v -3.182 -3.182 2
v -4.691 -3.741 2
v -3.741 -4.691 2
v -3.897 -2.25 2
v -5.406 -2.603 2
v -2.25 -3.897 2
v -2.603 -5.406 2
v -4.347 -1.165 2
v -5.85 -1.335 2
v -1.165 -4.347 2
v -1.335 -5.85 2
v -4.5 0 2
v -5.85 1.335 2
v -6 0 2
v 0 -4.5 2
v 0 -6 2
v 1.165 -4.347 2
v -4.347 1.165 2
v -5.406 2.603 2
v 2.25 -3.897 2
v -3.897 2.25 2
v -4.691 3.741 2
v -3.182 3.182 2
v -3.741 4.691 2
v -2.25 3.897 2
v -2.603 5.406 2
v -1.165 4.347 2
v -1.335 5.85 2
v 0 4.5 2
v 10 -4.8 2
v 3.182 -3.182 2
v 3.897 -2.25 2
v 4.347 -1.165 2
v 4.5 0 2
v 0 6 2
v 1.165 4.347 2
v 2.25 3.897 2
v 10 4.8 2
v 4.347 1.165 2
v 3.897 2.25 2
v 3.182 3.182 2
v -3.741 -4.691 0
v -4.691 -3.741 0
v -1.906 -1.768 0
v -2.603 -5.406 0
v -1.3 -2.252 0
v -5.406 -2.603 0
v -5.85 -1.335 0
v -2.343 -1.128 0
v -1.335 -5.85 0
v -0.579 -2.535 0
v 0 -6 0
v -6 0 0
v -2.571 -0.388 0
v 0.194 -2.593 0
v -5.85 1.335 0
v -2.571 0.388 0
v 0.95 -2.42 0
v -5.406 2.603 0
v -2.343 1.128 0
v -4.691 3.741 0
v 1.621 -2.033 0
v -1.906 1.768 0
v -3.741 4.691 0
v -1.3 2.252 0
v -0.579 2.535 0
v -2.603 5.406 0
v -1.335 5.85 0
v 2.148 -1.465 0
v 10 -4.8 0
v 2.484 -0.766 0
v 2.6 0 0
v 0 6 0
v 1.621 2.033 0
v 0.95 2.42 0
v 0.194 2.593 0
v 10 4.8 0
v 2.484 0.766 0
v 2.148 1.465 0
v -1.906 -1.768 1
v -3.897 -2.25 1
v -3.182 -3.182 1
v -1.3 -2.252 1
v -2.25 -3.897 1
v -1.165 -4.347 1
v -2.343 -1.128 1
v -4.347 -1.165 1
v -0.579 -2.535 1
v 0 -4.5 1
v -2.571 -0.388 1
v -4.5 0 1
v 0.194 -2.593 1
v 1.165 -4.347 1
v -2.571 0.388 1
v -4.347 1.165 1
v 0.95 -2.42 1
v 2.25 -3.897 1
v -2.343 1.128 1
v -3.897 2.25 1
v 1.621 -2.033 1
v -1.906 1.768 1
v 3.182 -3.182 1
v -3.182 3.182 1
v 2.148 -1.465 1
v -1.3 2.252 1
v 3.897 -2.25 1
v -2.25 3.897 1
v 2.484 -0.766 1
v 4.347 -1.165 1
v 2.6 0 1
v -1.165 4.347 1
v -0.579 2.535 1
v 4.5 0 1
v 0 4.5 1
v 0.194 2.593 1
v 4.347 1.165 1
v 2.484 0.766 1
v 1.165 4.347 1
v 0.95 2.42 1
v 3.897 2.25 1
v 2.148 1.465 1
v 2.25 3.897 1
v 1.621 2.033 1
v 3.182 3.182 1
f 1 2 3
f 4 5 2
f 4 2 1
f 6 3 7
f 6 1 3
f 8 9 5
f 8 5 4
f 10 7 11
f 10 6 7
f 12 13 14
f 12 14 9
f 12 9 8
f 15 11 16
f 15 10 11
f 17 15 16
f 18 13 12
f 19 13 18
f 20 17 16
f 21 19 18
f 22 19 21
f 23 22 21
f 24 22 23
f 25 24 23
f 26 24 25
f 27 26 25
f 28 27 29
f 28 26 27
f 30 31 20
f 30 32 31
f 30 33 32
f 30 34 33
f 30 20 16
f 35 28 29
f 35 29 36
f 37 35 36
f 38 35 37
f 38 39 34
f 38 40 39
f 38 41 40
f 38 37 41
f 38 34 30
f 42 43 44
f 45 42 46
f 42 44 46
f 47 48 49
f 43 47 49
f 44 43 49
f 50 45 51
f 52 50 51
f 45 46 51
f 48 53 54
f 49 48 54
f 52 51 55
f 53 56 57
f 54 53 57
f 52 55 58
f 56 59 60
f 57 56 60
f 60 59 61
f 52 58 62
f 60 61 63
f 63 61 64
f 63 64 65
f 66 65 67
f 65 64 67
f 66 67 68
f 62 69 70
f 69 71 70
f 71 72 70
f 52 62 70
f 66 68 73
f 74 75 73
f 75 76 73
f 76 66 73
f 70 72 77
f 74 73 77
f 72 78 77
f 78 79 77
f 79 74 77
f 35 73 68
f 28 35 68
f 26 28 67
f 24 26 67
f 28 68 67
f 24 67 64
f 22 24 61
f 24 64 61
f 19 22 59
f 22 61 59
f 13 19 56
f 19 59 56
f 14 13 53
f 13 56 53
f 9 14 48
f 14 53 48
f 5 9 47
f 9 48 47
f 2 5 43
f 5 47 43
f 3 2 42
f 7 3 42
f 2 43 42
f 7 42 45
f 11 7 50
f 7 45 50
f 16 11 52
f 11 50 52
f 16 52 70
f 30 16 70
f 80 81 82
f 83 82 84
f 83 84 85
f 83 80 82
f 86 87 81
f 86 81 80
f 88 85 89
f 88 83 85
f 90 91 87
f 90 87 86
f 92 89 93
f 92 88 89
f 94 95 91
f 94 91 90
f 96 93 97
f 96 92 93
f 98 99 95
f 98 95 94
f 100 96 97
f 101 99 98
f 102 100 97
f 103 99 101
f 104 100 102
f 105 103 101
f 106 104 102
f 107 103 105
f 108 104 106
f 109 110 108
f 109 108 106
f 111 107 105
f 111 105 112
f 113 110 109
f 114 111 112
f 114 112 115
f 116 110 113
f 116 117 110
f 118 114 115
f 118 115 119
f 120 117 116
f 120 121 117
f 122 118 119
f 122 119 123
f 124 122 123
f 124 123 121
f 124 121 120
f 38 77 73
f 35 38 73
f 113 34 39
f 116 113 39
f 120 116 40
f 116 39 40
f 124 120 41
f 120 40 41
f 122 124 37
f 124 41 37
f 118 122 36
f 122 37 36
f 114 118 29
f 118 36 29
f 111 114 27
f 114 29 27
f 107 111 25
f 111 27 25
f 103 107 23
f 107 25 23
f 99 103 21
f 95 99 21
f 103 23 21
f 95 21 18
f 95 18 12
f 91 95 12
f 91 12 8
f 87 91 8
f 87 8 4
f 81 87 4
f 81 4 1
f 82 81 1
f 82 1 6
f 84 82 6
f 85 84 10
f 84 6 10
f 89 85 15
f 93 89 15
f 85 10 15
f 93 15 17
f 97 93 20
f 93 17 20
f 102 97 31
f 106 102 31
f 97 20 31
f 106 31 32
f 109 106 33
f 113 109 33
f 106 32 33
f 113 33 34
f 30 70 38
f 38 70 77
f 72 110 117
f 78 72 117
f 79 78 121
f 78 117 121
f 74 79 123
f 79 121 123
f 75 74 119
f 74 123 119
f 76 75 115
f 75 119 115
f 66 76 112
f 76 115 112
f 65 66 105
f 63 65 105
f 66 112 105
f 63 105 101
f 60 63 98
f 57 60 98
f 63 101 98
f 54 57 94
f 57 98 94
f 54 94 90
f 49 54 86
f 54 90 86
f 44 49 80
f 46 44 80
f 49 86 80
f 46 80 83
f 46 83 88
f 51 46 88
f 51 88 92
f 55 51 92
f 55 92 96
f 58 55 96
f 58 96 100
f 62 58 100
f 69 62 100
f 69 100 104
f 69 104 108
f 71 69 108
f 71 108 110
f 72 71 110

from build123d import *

# Parameters (mm, degrees)
BOSS_EXTRUDE1_DEPTH = 2
SKETCH5_R           = 2.6
CUT_EXTRUDE1_DEPTH  = 2
SKETCH6_R           = 4.5
CUT_EXTRUDE2_DEPTH  = 1


with BuildPart() as part:
    # Sketch2 → Boss-Extrude1 (new body)
    with BuildSketch(Plane.XY):
        with BuildLine():
            Line((10, -4.8), (10, 4.8))
            Line((10, 4.8), (0, 6))
            ThreePointArc((0, 6), (-6, 0), (0, -6))
            Line((0, -6), (10, -4.8))
        make_face()
    extrude(amount=BOSS_EXTRUDE1_DEPTH)

    # Sketch5 → Cut-Extrude1 (cut)
    with BuildSketch(Plane.XY.offset(2)):
        Circle(SKETCH5_R)
    extrude(amount=-CUT_EXTRUDE1_DEPTH, mode=Mode.SUBTRACT)

    # Sketch6 → Cut-Extrude2 (cut)
    with BuildSketch(Plane.XY.offset(2)):
        Circle(SKETCH6_R)
    extrude(amount=-CUT_EXTRUDE2_DEPTH, mode=Mode.SUBTRACT)


solid = part.part
